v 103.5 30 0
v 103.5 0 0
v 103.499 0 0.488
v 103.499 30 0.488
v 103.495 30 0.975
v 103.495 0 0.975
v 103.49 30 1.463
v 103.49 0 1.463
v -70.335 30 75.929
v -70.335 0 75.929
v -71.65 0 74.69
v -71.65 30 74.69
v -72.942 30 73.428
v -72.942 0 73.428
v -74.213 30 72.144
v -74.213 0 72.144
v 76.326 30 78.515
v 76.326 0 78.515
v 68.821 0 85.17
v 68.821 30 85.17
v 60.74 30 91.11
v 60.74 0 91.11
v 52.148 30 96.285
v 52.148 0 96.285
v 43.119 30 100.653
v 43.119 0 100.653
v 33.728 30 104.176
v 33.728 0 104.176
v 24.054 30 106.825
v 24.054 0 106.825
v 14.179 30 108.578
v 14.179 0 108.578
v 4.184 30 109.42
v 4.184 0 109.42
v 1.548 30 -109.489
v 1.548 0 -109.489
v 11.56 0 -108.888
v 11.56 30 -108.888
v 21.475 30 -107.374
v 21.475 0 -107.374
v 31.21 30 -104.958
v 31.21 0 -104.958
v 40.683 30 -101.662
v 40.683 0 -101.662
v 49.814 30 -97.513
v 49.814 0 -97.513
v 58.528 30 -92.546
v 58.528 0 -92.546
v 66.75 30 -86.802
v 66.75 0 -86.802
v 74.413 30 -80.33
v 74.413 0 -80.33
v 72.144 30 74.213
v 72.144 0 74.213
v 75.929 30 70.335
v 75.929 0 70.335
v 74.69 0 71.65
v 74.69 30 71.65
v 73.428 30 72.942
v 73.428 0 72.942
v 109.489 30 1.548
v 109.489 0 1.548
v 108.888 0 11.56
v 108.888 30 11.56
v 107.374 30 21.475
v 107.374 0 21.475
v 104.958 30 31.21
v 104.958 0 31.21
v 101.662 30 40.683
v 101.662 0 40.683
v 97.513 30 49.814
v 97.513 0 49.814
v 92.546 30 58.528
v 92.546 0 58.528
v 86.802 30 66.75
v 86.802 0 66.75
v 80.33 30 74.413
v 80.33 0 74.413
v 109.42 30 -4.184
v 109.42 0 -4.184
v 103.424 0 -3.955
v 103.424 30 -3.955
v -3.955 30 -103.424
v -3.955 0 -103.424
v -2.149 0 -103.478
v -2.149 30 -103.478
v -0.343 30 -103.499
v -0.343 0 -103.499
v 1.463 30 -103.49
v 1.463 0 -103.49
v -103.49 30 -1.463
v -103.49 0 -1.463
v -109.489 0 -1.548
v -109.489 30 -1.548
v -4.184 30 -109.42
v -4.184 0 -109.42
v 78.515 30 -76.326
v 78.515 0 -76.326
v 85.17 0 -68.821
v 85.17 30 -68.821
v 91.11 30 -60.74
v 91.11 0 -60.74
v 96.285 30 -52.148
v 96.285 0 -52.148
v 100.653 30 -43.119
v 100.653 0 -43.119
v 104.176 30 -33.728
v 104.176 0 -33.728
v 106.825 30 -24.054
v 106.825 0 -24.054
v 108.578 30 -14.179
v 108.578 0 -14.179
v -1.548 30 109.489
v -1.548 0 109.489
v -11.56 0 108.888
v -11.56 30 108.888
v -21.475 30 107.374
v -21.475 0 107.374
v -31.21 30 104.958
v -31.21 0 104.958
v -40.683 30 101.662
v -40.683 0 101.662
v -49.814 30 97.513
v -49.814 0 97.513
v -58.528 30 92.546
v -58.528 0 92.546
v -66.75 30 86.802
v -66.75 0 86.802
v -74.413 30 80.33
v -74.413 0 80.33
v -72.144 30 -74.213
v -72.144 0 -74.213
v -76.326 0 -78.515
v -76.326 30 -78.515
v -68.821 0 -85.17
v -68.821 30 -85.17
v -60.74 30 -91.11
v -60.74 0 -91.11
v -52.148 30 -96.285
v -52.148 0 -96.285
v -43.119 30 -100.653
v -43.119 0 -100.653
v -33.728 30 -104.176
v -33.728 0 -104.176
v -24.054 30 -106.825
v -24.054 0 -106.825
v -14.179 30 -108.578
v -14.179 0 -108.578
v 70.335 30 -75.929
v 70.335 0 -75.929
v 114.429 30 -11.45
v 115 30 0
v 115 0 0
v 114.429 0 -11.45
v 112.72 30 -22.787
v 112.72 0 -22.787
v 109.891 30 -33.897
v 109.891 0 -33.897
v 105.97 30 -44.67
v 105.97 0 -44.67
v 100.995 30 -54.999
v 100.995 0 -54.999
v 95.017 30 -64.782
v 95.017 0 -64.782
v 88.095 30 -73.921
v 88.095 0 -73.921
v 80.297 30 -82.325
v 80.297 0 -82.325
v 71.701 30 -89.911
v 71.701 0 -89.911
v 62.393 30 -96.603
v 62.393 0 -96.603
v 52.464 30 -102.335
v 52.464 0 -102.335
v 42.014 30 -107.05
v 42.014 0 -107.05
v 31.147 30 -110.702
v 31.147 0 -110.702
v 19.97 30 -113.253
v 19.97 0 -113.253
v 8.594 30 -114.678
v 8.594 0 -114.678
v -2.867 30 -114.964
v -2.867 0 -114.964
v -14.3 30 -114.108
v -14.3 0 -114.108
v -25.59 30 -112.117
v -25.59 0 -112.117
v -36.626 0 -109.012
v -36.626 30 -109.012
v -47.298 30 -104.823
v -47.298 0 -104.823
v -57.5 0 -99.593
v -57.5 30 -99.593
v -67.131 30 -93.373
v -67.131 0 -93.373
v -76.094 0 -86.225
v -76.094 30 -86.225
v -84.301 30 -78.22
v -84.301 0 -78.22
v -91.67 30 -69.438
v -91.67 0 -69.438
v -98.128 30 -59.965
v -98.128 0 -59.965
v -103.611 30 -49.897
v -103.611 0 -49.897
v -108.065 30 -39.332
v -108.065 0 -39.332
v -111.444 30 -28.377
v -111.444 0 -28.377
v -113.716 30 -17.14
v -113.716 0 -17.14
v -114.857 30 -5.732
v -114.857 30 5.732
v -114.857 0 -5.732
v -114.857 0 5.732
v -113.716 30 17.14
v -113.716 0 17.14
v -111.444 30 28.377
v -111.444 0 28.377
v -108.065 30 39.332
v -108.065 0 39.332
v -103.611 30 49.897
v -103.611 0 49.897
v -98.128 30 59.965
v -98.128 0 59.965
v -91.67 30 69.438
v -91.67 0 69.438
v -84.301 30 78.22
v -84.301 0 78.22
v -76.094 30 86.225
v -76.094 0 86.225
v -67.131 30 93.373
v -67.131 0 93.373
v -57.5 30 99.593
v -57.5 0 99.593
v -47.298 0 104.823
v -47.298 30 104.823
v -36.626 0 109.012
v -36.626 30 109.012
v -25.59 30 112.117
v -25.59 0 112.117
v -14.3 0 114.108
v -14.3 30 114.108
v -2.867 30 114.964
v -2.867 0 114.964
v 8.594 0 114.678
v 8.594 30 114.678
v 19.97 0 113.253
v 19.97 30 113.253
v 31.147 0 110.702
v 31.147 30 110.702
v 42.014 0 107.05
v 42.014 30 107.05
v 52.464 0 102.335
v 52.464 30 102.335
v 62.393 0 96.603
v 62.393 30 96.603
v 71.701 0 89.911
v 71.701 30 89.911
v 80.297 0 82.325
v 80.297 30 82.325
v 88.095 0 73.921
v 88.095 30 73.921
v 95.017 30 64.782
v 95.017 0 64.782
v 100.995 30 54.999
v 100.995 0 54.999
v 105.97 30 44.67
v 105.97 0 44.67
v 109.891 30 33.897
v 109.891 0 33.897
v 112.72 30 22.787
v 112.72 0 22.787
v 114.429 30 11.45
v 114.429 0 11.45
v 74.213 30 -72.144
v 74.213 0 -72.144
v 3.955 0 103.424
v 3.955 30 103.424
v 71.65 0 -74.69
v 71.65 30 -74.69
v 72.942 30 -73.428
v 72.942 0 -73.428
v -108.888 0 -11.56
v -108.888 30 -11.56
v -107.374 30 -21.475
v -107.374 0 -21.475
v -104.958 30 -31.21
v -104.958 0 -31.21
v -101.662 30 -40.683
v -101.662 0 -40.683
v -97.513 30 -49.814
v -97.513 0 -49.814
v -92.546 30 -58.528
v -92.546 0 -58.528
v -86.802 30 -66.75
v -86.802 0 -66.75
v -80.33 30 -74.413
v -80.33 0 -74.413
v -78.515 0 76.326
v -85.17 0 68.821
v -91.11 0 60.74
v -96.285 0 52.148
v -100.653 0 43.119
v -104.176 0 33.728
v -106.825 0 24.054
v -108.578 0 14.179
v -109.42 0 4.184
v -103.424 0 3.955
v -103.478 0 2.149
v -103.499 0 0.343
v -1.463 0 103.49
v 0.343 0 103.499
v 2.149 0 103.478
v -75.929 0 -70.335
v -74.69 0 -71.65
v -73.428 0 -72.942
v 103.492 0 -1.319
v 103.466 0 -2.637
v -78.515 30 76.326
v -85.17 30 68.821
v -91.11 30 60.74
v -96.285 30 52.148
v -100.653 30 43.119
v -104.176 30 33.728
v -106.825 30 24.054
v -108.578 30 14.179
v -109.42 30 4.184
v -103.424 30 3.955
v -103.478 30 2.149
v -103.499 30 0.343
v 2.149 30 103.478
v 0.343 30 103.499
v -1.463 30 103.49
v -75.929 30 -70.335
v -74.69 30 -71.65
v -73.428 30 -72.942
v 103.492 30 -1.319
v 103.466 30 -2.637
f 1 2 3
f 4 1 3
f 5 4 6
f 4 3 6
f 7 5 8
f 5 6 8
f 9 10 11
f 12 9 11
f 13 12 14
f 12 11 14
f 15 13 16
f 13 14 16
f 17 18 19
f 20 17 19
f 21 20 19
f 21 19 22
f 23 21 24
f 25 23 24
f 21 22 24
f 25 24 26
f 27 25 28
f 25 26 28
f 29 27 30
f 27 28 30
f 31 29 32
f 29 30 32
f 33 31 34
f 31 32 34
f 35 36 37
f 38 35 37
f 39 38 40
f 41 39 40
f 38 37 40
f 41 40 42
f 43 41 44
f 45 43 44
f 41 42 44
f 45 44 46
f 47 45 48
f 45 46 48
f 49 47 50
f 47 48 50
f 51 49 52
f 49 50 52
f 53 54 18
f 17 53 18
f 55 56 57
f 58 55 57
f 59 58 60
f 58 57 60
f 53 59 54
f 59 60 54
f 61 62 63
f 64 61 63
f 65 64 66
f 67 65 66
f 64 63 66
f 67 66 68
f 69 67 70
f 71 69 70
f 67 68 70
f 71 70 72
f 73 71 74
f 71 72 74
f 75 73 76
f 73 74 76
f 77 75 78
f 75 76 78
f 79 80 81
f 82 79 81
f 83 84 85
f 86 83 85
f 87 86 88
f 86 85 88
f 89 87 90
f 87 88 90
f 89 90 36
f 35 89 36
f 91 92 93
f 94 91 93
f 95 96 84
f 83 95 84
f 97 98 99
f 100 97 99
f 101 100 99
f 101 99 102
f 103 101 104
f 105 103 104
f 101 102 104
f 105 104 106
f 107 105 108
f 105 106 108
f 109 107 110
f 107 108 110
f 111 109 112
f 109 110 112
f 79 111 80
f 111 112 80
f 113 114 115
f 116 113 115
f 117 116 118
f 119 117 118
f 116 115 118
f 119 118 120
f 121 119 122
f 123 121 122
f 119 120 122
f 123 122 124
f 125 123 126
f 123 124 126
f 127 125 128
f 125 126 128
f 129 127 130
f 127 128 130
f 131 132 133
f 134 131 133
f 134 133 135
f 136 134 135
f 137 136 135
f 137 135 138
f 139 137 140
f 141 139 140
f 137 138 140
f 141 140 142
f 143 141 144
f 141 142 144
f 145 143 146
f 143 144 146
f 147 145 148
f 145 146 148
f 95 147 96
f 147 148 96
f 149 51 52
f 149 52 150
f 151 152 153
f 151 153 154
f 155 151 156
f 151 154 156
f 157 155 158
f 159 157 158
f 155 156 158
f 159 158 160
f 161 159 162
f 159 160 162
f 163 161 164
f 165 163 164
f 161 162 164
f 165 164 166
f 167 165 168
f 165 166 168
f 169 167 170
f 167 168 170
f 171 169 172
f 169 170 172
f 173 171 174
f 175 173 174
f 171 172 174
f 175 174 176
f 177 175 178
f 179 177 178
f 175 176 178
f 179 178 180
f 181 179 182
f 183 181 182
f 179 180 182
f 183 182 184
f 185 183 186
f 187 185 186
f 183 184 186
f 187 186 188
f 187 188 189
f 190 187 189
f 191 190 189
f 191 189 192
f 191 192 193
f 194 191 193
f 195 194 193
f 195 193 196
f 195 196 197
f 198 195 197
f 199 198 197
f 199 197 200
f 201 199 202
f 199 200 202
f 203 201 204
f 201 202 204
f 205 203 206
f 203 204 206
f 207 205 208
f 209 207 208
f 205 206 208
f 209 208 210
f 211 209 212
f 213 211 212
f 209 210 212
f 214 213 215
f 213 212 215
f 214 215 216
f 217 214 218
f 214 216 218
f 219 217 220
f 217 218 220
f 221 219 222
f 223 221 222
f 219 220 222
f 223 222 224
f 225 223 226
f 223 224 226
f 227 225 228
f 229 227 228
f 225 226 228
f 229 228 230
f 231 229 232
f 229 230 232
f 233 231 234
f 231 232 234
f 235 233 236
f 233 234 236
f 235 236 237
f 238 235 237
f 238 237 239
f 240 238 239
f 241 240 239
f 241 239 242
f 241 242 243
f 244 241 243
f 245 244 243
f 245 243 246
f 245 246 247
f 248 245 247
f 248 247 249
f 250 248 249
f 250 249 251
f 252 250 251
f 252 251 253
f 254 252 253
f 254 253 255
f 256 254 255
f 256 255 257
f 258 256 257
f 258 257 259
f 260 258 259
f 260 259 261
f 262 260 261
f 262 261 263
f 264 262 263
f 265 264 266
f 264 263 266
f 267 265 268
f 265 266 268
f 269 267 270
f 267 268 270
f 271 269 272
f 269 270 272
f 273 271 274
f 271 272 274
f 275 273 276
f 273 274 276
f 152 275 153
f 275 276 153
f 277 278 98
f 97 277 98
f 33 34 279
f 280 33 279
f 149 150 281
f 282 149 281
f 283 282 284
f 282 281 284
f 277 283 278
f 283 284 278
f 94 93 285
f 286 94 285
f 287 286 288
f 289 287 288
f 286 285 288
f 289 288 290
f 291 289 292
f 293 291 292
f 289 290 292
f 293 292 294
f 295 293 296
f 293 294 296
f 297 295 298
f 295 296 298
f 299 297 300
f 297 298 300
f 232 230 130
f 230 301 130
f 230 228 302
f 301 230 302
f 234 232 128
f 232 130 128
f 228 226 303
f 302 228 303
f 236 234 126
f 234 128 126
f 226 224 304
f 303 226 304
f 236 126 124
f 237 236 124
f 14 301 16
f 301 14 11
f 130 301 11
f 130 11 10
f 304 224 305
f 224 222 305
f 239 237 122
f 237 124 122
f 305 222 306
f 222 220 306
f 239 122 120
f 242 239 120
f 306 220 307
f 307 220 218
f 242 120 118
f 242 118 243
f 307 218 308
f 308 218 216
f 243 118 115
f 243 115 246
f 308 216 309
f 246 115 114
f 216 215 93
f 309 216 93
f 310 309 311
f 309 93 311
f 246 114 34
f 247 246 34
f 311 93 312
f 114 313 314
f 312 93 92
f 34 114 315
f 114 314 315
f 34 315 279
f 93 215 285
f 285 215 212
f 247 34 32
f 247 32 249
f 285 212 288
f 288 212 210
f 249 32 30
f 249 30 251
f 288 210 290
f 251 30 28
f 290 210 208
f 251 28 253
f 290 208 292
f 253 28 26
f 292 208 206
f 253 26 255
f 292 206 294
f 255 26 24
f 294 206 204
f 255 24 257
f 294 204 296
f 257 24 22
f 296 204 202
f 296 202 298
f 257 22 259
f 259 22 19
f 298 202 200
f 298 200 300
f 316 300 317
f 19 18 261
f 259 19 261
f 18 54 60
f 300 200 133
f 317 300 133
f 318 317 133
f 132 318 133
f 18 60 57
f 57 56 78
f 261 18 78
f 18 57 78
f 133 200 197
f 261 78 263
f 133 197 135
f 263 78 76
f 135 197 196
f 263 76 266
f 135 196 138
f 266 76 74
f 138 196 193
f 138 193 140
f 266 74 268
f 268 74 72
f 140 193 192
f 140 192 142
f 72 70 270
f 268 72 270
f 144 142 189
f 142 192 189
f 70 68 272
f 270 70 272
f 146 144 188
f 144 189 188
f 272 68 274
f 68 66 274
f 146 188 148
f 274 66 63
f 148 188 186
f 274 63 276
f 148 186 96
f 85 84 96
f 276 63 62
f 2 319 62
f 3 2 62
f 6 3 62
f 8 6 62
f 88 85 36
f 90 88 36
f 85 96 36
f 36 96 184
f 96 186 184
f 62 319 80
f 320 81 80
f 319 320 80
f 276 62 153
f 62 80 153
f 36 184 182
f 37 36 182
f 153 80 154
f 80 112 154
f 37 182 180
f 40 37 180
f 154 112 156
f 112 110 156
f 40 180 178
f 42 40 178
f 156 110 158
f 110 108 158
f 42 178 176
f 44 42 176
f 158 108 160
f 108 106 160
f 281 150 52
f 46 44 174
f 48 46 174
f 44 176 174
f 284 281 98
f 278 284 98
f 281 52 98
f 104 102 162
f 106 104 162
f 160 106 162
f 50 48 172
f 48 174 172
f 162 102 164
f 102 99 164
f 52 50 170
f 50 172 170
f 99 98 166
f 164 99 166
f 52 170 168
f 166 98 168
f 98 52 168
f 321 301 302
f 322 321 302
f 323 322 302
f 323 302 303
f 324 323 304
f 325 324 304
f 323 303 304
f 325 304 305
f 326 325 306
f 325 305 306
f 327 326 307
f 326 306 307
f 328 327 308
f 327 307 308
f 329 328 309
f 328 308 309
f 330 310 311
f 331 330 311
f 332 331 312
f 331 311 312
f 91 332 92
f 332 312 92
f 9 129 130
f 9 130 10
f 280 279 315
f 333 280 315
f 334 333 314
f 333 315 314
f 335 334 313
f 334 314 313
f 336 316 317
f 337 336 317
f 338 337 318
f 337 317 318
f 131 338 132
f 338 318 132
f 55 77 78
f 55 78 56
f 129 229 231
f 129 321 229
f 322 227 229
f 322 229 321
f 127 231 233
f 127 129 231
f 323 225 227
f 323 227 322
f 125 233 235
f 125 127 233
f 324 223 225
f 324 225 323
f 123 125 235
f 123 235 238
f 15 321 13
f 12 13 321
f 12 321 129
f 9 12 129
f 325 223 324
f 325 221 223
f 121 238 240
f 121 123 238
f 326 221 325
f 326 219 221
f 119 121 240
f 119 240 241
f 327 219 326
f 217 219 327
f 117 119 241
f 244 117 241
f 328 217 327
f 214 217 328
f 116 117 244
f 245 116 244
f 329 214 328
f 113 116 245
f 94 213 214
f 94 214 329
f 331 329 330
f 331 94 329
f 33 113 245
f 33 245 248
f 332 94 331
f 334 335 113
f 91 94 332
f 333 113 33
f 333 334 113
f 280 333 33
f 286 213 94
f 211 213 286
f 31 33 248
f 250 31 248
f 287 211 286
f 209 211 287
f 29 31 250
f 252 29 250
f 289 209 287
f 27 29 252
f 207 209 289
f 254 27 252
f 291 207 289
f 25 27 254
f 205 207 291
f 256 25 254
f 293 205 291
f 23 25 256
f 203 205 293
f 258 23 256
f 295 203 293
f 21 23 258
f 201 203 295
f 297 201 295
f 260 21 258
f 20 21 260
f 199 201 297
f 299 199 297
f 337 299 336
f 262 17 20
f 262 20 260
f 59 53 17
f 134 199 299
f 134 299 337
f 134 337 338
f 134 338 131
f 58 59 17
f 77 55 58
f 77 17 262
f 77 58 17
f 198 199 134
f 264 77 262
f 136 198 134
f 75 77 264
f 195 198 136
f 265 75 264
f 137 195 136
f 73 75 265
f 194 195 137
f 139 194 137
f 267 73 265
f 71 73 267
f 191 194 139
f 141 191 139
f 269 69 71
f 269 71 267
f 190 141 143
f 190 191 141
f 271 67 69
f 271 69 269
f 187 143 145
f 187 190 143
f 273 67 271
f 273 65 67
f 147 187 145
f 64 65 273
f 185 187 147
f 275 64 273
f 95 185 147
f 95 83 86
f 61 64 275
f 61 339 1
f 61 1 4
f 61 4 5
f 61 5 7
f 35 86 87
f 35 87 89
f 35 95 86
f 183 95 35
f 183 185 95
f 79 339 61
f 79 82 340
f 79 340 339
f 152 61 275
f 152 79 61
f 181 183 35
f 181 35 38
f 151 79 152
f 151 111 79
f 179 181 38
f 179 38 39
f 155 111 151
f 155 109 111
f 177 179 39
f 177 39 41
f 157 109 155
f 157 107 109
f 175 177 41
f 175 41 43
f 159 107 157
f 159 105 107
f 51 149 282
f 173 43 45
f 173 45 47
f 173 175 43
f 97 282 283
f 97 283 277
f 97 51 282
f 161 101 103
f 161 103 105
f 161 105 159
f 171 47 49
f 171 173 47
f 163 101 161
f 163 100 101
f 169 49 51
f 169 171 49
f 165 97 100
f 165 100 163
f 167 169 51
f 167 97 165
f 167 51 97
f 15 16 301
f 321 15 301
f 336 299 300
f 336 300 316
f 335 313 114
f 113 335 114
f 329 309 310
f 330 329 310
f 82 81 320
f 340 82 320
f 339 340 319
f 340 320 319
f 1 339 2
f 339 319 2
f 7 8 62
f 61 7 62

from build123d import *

# Parameters (mm, degrees)
SKETCH1_R           = 115
BOSS_EXTRUDE1_DEPTH = 30


with BuildPart() as part:
    # Sketch1 → Boss-Extrude1 (new body)
    with BuildSketch(Plane(origin=(0, 0, 0), x_dir=(1, 0, 0), z_dir=(0, 1, 0))):
        Circle(SKETCH1_R)
        with BuildLine():
            ThreePointArc((-3.955044182, 103.424405367), (-1.246353574, 103.492495393), (1.463191222, 103.489656833))
            Line((1.463191222, 103.489656833), (1.548013902, 109.489057229))
            ThreePointArc((1.548013902, 109.489057229), (40.682564415, 101.662082177), (74.412877774, 80.330402846))
            Line((74.412877774, 80.330402846), (70.335459814, 75.928736936))
            ThreePointArc((70.335459814, 75.928736936), (72.29894023, 74.061550359), (74.212870565, 72.143605694))
            Line((74.212870565, 72.143605694), (78.51506596, 76.325843705))
            ThreePointArc((78.51506596, 76.325843705), (100.652864871, 43.119030523), (109.420023069, 4.184322106))
            Line((109.420023069, 4.184322106), (103.424405367, 3.955044182))
            ThreePointArc((103.424405367, 3.955044182), (103.481099616, 1.977883277), (103.5, 0))
            ThreePointArc((103.5, 0), (103.497414176, -0.73161389), (103.489656833, -1.463191222))
            Line((103.489656833, -1.463191222), (109.489057229, -1.548013902))
            ThreePointArc((109.489057229, -1.548013902), (101.662082177, -40.682564415), (80.330402846, -74.412877774))
            Line((80.330402846, -74.412877774), (75.928736936, -70.335459814))
            ThreePointArc((75.928736936, -70.335459814), (74.061550359, -72.29894023), (72.143605694, -74.212870565))
            Line((72.143605694, -74.212870565), (76.325843705, -78.51506596))
            ThreePointArc((76.325843705, -78.51506596), (43.119030523, -100.652864871), (4.184322106, -109.420023069))
            Line((4.184322106, -109.420023069), (3.955044182, -103.424405367))
            ThreePointArc((3.955044182, -103.424405367), (1.246353574, -103.492495393), (-1.463191222, -103.489656833))
            Line((-1.463191222, -103.489656833), (-1.548013902, -109.489057229))
            ThreePointArc((-1.548013902, -109.489057229), (-40.682564415, -101.662082177), (-74.412877774, -80.330402846))
            Line((-74.412877774, -80.330402846), (-70.335459814, -75.928736936))
            ThreePointArc((-70.335459814, -75.928736936), (-72.29894023, -74.061550359), (-74.212870565, -72.143605694))
            Line((-74.212870565, -72.143605694), (-78.51506596, -76.325843705))
            ThreePointArc((-78.51506596, -76.325843705), (-100.652864871, -43.119030523), (-109.420023069, -4.184322106))
            Line((-109.420023069, -4.184322106), (-103.424405367, -3.955044182))
            ThreePointArc((-103.424405367, -3.955044182), (-103.492495393, -1.246353574), (-103.489656833, 1.463191222))
            Line((-103.489656833, 1.463191222), (-109.489057229, 1.548013902))
            ThreePointArc((-109.489057229, 1.548013902), (-101.662082177, 40.682564415), (-80.330402846, 74.412877774))
            Line((-80.330402846, 74.412877774), (-75.928736936, 70.335459814))
            ThreePointArc((-75.928736936, 70.335459814), (-74.061550359, 72.29894023), (-72.143605694, 74.212870565))
            Line((-72.143605694, 74.212870565), (-76.325843705, 78.51506596))
            ThreePointArc((-76.325843705, 78.51506596), (-43.119030523, 100.652864871), (-4.184322106, 109.420023069))
            Line((-4.184322106, 109.420023069), (-3.955044182, 103.424405367))
        make_face(mode=Mode.SUBTRACT)
    extrude(amount=BOSS_EXTRUDE1_DEPTH)


solid = part.part
